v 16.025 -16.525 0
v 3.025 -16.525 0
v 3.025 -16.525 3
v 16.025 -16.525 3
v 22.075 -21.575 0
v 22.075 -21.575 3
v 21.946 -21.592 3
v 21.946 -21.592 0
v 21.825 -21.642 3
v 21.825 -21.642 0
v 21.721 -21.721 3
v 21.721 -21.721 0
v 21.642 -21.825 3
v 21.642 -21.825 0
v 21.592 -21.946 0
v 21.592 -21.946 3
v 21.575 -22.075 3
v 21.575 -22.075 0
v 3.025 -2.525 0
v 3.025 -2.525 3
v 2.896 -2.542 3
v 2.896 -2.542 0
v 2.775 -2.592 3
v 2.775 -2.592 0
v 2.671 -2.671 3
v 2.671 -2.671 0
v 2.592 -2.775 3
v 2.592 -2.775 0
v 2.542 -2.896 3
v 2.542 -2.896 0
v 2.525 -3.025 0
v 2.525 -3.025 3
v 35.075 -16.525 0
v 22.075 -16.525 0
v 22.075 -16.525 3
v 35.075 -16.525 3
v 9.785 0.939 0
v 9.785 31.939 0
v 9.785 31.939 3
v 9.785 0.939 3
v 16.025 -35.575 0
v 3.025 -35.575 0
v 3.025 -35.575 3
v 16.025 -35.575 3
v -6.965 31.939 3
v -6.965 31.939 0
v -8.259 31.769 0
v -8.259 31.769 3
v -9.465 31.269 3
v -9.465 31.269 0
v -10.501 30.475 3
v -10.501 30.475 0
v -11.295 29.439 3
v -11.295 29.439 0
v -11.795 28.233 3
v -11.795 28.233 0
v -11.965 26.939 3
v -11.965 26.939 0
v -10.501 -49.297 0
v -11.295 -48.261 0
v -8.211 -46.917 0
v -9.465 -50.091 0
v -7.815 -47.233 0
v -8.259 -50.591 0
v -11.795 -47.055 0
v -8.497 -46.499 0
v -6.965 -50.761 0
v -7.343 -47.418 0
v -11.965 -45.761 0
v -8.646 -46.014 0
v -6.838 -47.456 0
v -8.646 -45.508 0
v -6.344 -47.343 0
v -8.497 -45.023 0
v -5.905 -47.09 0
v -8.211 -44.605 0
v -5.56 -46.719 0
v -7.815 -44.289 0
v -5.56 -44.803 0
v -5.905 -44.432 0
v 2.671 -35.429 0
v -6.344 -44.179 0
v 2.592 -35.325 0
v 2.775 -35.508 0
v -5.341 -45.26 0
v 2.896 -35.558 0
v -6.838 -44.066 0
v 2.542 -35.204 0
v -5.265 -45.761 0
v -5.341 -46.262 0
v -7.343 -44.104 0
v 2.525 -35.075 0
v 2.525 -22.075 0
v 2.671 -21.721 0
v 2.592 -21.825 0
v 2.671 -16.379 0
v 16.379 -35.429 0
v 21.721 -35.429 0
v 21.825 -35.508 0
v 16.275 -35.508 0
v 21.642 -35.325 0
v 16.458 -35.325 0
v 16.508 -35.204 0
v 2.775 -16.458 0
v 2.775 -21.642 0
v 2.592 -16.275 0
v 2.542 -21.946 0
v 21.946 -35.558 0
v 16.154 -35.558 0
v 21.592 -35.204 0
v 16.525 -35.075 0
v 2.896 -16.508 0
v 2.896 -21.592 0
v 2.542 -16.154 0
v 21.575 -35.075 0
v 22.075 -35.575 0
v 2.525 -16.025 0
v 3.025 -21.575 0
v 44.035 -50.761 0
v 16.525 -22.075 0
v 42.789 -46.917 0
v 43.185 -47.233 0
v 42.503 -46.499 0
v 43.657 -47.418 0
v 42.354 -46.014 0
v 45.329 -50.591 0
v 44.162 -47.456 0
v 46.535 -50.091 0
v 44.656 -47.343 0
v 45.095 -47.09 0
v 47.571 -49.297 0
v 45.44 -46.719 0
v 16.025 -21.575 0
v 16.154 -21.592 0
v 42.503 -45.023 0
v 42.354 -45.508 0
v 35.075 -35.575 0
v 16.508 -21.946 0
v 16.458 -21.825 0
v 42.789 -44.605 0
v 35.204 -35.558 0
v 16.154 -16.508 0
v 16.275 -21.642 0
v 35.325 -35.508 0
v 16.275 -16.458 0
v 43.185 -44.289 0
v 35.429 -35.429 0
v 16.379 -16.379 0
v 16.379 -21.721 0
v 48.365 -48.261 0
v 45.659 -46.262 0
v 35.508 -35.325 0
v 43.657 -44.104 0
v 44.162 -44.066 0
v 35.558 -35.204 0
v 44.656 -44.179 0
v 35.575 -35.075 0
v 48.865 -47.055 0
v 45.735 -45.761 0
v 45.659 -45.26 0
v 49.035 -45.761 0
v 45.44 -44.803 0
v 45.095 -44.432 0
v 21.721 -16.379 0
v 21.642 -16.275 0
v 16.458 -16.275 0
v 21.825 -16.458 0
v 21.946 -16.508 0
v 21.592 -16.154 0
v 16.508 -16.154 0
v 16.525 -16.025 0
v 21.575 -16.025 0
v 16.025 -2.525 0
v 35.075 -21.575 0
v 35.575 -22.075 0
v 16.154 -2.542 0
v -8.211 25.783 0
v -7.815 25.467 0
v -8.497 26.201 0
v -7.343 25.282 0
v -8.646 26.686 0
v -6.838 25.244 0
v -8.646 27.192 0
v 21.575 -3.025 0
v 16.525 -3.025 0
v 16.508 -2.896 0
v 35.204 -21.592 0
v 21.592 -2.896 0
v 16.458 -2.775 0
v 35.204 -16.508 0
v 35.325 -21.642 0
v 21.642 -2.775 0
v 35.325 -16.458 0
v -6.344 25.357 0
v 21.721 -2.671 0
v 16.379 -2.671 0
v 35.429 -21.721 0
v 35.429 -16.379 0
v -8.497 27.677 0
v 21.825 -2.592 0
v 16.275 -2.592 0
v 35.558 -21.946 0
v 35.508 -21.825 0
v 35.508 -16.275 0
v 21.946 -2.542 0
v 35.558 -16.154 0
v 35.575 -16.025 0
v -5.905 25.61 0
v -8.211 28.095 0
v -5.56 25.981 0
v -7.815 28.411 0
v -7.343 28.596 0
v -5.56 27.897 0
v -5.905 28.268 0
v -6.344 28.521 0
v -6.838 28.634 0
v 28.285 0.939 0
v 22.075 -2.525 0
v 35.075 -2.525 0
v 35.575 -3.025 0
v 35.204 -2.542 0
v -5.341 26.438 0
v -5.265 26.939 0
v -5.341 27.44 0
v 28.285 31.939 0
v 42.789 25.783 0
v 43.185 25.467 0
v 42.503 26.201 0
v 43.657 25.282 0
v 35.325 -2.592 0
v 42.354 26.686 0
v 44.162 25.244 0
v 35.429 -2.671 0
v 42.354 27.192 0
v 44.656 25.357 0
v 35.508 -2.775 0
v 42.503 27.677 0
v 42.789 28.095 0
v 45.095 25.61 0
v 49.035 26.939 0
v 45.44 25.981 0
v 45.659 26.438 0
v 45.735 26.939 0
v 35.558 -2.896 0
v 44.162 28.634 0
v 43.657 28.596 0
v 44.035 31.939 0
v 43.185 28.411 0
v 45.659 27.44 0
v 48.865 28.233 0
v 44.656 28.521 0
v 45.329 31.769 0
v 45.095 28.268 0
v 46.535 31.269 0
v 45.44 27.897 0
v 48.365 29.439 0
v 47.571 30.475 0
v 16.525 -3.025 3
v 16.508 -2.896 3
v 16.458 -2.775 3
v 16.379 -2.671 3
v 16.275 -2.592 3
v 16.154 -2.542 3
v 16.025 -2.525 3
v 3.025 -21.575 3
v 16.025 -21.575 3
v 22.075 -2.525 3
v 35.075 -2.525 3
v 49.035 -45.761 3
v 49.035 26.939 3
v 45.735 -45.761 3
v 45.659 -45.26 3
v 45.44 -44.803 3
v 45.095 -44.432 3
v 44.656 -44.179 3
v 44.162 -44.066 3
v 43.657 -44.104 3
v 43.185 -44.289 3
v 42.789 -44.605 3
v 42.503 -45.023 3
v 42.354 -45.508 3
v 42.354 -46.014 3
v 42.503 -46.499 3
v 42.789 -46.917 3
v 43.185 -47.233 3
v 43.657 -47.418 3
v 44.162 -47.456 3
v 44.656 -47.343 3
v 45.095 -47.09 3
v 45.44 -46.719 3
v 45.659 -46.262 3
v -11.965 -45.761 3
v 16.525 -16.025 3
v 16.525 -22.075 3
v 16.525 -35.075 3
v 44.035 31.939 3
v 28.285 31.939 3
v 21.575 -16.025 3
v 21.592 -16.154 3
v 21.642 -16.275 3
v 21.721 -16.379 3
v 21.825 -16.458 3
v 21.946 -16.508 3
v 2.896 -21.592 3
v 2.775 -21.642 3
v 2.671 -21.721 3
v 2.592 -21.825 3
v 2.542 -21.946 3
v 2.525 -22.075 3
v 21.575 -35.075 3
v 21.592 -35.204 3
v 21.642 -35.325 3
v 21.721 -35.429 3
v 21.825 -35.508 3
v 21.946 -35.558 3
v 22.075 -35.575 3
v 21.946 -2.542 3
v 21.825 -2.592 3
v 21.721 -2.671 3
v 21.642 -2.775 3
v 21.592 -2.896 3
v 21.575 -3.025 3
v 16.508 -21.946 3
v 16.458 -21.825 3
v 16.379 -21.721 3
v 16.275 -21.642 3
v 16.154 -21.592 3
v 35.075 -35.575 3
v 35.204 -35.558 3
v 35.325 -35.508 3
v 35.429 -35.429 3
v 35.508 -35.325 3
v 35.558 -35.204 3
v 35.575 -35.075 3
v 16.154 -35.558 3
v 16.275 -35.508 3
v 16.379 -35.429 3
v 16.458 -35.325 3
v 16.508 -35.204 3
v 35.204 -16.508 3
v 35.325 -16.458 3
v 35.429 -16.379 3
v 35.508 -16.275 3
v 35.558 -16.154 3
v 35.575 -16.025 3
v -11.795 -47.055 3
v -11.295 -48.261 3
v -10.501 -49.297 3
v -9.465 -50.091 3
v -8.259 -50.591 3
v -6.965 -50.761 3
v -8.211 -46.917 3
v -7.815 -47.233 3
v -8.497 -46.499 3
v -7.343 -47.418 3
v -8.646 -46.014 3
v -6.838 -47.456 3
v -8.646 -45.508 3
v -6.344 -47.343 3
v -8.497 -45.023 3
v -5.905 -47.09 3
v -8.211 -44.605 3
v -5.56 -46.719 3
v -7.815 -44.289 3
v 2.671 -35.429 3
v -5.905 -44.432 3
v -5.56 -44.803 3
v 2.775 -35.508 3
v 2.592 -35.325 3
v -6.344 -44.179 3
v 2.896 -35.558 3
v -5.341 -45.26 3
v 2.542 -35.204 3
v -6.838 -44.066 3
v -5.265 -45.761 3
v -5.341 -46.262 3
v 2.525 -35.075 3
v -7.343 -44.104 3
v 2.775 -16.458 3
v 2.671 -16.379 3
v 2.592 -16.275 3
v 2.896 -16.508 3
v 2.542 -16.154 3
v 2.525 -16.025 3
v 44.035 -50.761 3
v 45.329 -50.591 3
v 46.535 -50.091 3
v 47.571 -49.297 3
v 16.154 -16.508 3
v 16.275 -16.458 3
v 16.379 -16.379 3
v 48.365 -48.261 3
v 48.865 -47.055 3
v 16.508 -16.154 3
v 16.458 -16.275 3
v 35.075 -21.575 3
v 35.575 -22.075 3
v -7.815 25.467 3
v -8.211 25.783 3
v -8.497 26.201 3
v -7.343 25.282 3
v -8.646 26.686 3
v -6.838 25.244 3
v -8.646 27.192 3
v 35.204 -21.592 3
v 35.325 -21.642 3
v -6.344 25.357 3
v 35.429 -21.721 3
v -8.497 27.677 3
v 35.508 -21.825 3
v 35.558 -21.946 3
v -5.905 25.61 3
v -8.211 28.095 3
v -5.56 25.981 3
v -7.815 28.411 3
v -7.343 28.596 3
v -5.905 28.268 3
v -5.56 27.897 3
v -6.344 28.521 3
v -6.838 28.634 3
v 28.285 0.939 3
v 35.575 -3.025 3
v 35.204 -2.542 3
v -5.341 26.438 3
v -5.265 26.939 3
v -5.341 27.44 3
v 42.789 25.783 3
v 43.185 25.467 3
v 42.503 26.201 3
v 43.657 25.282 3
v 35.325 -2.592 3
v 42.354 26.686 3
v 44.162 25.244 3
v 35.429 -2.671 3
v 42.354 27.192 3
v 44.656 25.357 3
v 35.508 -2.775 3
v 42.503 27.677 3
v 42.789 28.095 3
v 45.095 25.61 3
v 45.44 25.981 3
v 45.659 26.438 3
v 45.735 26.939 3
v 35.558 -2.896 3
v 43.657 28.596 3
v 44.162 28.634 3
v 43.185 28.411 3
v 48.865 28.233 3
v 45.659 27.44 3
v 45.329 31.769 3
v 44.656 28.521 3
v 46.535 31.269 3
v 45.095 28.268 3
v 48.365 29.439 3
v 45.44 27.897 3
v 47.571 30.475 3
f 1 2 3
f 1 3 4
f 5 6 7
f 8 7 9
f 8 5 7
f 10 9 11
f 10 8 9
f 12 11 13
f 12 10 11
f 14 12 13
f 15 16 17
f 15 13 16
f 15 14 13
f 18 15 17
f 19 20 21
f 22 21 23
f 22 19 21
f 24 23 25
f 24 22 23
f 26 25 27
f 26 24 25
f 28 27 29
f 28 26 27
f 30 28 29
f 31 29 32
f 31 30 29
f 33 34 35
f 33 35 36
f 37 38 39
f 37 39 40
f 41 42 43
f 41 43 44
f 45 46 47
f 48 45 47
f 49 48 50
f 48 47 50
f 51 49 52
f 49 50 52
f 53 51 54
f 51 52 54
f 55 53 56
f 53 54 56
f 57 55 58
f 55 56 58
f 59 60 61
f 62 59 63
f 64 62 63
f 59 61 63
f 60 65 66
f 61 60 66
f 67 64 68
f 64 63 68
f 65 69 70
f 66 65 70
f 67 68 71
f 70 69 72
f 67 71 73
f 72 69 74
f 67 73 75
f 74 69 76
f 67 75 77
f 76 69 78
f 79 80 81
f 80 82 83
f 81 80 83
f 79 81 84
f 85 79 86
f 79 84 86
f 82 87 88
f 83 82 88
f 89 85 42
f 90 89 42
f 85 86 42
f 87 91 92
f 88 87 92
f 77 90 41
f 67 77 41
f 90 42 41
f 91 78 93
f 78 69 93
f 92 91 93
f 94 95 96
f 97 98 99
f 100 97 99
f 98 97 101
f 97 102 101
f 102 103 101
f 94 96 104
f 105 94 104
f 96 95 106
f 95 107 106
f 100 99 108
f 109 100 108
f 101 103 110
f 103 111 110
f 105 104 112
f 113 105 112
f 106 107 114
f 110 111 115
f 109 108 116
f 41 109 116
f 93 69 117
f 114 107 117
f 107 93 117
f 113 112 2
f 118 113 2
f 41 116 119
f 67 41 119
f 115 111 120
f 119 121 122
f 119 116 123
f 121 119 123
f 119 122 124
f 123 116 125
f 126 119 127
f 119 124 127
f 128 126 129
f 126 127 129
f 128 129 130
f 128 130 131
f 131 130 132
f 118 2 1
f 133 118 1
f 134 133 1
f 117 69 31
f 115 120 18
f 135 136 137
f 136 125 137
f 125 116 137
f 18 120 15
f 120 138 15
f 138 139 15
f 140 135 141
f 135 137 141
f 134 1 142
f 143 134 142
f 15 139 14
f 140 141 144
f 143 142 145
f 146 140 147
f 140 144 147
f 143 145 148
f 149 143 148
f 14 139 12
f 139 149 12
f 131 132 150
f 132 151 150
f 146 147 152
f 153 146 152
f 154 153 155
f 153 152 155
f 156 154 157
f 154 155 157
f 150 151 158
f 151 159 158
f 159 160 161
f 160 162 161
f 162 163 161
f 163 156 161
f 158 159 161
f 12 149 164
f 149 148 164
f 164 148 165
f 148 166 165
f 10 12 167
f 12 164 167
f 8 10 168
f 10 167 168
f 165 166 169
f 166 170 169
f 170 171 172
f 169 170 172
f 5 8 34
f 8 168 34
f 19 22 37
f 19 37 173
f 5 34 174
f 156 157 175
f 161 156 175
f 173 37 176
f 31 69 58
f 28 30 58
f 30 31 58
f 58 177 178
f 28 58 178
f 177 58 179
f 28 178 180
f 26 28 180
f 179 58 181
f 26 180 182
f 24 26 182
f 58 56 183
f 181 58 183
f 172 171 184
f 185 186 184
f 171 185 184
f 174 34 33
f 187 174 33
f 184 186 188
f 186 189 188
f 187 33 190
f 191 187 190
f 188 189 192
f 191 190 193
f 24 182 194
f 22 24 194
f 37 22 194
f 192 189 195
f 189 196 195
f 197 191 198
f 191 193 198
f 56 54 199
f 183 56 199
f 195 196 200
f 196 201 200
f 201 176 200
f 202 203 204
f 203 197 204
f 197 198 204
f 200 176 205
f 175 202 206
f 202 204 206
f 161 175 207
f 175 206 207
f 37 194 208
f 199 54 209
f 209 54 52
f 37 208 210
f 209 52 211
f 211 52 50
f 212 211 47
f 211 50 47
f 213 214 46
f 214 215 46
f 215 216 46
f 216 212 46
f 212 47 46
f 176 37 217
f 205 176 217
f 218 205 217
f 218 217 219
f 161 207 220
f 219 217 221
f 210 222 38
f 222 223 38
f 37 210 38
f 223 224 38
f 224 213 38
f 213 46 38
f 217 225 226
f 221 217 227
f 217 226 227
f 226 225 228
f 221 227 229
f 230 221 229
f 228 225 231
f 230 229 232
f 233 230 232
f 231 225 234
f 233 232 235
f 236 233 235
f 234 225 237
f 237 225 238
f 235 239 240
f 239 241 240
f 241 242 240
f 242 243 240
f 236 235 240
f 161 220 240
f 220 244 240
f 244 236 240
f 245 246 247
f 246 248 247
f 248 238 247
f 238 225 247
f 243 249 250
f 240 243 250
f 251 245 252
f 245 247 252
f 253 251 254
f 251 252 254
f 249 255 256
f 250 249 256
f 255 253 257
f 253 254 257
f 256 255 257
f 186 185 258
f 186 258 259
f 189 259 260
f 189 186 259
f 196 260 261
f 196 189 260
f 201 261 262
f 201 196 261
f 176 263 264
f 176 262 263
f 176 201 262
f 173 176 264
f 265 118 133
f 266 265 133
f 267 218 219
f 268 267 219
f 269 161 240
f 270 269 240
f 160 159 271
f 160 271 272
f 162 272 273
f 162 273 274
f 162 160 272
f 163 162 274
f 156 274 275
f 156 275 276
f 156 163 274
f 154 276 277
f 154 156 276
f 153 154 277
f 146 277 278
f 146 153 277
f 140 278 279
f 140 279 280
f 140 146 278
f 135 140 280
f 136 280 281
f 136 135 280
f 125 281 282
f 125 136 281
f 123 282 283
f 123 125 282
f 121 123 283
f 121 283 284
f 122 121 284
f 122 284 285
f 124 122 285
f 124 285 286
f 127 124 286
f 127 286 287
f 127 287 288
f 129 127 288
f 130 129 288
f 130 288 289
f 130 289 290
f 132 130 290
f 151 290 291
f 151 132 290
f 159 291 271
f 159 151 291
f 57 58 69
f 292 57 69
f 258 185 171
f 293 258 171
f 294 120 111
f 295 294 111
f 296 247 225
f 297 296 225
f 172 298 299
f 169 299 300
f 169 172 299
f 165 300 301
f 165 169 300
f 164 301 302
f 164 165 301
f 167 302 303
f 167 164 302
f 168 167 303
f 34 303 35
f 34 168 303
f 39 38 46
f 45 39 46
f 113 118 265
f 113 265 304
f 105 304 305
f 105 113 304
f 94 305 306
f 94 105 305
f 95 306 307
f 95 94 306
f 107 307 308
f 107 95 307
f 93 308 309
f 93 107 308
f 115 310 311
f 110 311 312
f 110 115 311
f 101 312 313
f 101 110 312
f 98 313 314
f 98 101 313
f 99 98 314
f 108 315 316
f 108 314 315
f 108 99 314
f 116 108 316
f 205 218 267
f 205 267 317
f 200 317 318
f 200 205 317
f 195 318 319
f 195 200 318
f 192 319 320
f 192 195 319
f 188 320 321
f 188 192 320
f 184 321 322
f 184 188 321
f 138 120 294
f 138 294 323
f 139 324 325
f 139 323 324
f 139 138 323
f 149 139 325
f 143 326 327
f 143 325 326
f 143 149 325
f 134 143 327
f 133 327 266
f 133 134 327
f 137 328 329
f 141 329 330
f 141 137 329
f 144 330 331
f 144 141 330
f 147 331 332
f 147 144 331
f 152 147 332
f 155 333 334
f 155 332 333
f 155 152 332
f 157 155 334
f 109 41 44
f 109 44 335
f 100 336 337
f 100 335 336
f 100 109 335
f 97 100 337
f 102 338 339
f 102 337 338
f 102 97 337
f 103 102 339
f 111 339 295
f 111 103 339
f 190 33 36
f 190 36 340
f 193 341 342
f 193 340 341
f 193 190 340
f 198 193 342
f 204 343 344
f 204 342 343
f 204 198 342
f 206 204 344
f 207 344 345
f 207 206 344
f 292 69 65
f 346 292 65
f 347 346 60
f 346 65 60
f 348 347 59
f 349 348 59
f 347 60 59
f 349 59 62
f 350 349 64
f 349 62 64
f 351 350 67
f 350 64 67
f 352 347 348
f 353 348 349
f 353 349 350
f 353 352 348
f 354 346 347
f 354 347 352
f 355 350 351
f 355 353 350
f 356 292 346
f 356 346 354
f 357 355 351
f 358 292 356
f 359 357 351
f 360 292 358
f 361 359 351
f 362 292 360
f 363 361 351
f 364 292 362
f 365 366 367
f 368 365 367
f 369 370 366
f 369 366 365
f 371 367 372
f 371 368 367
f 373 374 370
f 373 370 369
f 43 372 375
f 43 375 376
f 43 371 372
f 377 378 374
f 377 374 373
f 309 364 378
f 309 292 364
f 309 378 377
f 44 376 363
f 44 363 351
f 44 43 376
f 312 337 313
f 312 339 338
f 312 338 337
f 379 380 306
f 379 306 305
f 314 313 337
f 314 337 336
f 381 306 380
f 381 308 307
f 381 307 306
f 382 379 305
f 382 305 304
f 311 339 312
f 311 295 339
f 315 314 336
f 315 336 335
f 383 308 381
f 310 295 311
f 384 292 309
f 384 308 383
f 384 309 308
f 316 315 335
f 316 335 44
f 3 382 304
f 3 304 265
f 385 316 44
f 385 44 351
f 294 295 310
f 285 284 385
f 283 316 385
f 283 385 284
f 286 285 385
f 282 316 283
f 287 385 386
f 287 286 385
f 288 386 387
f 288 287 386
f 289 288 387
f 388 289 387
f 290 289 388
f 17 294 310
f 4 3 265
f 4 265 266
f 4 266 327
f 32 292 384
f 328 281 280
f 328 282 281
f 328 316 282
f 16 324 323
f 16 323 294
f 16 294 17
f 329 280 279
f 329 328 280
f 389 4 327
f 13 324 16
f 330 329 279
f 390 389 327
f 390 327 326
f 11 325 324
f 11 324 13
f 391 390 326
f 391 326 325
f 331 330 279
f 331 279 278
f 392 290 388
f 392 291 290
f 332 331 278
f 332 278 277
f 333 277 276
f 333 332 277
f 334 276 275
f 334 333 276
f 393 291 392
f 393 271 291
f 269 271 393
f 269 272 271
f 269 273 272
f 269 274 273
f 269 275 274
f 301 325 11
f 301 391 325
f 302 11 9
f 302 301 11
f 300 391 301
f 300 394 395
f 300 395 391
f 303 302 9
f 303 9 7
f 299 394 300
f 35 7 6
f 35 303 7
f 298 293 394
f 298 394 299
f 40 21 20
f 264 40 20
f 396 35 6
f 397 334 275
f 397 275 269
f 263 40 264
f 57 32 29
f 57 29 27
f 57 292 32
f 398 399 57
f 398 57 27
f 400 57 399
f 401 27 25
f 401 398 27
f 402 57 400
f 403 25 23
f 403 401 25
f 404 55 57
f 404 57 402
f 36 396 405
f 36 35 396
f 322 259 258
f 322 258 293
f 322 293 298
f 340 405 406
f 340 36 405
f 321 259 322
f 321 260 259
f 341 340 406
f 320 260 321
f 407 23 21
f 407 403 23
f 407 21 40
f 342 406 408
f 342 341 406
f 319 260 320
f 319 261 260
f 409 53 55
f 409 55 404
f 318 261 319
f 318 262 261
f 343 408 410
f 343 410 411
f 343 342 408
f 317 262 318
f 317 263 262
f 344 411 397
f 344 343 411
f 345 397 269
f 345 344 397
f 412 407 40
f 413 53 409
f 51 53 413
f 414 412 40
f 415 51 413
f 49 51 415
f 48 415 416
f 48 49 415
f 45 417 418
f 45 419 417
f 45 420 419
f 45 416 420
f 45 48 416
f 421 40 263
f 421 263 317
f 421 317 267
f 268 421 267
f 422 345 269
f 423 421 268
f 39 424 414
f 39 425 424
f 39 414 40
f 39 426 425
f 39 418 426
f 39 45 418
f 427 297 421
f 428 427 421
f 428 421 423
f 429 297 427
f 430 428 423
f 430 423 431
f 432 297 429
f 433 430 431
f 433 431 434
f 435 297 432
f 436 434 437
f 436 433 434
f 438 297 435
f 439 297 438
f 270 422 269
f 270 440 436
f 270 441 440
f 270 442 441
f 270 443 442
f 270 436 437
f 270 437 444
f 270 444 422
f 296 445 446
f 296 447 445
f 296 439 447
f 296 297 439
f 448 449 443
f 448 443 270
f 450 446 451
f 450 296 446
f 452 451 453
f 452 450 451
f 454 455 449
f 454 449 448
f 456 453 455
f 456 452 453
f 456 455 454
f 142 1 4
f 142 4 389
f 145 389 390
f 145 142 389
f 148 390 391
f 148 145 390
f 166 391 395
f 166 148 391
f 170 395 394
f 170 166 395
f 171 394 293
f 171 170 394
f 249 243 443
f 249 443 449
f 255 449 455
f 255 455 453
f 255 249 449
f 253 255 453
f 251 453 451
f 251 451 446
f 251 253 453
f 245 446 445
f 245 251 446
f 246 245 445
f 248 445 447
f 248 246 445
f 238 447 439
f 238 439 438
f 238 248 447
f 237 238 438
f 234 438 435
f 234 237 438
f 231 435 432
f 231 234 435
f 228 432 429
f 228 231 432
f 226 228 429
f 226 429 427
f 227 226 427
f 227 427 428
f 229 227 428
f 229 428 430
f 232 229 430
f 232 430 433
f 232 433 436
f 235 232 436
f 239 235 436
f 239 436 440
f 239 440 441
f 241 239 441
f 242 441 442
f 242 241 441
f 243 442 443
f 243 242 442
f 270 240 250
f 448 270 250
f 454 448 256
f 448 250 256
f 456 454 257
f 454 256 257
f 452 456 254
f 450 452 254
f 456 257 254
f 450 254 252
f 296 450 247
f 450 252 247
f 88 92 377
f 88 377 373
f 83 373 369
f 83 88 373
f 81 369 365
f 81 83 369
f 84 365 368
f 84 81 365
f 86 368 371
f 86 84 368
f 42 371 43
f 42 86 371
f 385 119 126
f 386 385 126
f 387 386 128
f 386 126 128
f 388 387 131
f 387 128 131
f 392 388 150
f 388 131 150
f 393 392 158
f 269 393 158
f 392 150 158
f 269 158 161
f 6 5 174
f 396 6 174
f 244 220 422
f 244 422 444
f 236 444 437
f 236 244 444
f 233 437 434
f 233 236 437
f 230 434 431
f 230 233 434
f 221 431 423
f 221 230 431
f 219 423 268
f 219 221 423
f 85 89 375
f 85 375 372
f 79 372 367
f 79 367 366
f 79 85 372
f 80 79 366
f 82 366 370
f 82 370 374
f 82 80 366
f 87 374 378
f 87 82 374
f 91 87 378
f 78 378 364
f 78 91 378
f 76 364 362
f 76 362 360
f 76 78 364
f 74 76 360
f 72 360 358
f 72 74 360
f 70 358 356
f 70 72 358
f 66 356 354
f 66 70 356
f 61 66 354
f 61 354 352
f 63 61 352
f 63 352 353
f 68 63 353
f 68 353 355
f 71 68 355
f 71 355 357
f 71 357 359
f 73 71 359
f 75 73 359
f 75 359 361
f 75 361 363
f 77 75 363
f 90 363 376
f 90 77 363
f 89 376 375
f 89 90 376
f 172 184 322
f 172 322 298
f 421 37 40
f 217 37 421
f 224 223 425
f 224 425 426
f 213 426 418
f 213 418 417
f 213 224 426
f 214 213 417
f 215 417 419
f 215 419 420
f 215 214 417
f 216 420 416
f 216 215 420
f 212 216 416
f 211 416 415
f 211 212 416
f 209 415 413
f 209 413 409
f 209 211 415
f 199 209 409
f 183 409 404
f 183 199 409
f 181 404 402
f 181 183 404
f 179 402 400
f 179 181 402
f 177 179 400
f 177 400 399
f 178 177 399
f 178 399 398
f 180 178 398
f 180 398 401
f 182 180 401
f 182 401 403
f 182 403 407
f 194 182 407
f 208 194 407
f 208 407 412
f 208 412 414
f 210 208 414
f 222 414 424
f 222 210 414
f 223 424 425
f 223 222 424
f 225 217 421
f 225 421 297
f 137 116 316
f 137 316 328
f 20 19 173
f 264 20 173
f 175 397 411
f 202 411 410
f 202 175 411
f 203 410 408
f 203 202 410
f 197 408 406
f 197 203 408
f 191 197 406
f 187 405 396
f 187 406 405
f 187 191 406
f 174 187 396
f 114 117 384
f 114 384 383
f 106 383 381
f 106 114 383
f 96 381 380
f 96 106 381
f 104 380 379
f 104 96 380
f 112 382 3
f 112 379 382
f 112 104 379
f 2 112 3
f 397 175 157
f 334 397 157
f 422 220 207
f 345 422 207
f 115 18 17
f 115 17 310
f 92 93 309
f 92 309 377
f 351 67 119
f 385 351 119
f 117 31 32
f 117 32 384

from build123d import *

# Parameters (mm, degrees)
SKETCH001_R  = 1.7
PAD_DEPTH    = 3
POCKET_DEPTH = 10


with BuildPart() as part:
    # Sketch001 → Pad (new body)
    with BuildSketch(Plane.XY):
        with BuildLine():
            Line((-11.965, 26.939), (-11.965, -45.761))
            ThreePointArc((-11.965, -45.761), (-10.500534, -49.296534), (-6.965, -50.761))
            Line((-6.965, -50.761), (44.035, -50.761))
            ThreePointArc((44.035, -50.761), (47.570534, -49.296534), (49.035, -45.761))
            Line((49.035, -45.761), (49.035, 26.939))
            ThreePointArc((49.035, 26.939), (47.570534, 30.474534), (44.035, 31.939))
            Line((44.035, 31.939), (28.285, 31.939))
            Line((28.285, 0.939), (28.285, 31.939))
            Line((9.785, 0.939), (28.285, 0.939))
            Line((9.785, 31.939), (9.785, 0.939))
            Line((9.785, 31.939), (-6.965, 31.939))
            ThreePointArc((-6.965, 31.939), (-10.500534, 30.474534), (-11.965, 26.939))
        make_face()
        with Locations((-6.965, -45.761)):
            Circle(SKETCH001_R, mode=Mode.SUBTRACT)
        with Locations((44.035, -45.761)):
            Circle(SKETCH001_R, mode=Mode.SUBTRACT)
        with Locations((44.035, 26.939)):
            Circle(SKETCH001_R, mode=Mode.SUBTRACT)
        with Locations((-6.965, 26.939)):
            Circle(SKETCH001_R, mode=Mode.SUBTRACT)
    extrude(amount=PAD_DEPTH)

    # Sketch → Pocket (cut)
    with BuildSketch(Plane.XY):
        with BuildLine():
            Line((3.025, -2.525), (16.025, -2.525))
            ThreePointArc((16.525, -3.025), (16.378553, -2.671447), (16.025, -2.525))
            Line((16.525, -3.025), (16.525, -16.025))
            ThreePointArc((16.025, -16.525), (16.378553, -16.378553), (16.525, -16.025))
            Line((3.025, -16.525), (16.025, -16.525))
            ThreePointArc((2.525, -16.025), (2.671447, -16.378553), (3.025, -16.525))
            Line((2.525, -3.025), (2.525, -16.025))
            ThreePointArc((3.025, -2.525), (2.671447, -2.671447), (2.525, -3.025))
        make_face()
        with BuildLine():
            Line((22.075, -2.525), (35.075, -2.525))
            ThreePointArc((35.575, -3.025), (35.428553, -2.671447), (35.075, -2.525))
            Line((35.575, -3.025), (35.575, -16.025))
            ThreePointArc((35.075, -16.525), (35.428553, -16.378553), (35.575, -16.025))
            Line((22.075, -16.525), (35.075, -16.525))
            ThreePointArc((21.575, -16.025), (21.721447, -16.378553), (22.075, -16.525))
            Line((21.575, -3.025), (21.575, -16.025))
            ThreePointArc((22.075, -2.525), (21.721447, -2.671447), (21.575, -3.025))
        make_face()
        with BuildLine():
            Line((3.025, -21.575), (16.025, -21.575))
            ThreePointArc((16.525, -22.075), (16.378553, -21.721447), (16.025, -21.575))
            Line((16.525, -22.075), (16.525, -35.075))
            ThreePointArc((16.025, -35.575), (16.378553, -35.428553), (16.525, -35.075))
            Line((3.025, -35.575), (16.025, -35.575))
            ThreePointArc((2.525, -35.075), (2.671447, -35.428553), (3.025, -35.575))
            Line((2.525, -22.075), (2.525, -35.075))
            ThreePointArc((3.025, -21.575), (2.671447, -21.721447), (2.525, -22.075))
        make_face()
        with BuildLine():
            Line((22.075, -21.575), (35.075, -21.575))
            ThreePointArc((35.575, -22.075), (35.428553, -21.721447), (35.075, -21.575))
            Line((35.575, -22.075), (35.575, -35.075))
            ThreePointArc((35.075, -35.575), (35.428553, -35.428553), (35.575, -35.075))
            Line((22.075, -35.575), (35.075, -35.575))
            ThreePointArc((21.575, -35.075), (21.721447, -35.428553), (22.075, -35.575))
            Line((21.575, -22.075), (21.575, -35.075))
            ThreePointArc((22.075, -21.575), (21.721447, -21.721447), (21.575, -22.075))
        make_face()
    extrude(amount=POCKET_DEPTH, mode=Mode.SUBTRACT)


solid = part.part
